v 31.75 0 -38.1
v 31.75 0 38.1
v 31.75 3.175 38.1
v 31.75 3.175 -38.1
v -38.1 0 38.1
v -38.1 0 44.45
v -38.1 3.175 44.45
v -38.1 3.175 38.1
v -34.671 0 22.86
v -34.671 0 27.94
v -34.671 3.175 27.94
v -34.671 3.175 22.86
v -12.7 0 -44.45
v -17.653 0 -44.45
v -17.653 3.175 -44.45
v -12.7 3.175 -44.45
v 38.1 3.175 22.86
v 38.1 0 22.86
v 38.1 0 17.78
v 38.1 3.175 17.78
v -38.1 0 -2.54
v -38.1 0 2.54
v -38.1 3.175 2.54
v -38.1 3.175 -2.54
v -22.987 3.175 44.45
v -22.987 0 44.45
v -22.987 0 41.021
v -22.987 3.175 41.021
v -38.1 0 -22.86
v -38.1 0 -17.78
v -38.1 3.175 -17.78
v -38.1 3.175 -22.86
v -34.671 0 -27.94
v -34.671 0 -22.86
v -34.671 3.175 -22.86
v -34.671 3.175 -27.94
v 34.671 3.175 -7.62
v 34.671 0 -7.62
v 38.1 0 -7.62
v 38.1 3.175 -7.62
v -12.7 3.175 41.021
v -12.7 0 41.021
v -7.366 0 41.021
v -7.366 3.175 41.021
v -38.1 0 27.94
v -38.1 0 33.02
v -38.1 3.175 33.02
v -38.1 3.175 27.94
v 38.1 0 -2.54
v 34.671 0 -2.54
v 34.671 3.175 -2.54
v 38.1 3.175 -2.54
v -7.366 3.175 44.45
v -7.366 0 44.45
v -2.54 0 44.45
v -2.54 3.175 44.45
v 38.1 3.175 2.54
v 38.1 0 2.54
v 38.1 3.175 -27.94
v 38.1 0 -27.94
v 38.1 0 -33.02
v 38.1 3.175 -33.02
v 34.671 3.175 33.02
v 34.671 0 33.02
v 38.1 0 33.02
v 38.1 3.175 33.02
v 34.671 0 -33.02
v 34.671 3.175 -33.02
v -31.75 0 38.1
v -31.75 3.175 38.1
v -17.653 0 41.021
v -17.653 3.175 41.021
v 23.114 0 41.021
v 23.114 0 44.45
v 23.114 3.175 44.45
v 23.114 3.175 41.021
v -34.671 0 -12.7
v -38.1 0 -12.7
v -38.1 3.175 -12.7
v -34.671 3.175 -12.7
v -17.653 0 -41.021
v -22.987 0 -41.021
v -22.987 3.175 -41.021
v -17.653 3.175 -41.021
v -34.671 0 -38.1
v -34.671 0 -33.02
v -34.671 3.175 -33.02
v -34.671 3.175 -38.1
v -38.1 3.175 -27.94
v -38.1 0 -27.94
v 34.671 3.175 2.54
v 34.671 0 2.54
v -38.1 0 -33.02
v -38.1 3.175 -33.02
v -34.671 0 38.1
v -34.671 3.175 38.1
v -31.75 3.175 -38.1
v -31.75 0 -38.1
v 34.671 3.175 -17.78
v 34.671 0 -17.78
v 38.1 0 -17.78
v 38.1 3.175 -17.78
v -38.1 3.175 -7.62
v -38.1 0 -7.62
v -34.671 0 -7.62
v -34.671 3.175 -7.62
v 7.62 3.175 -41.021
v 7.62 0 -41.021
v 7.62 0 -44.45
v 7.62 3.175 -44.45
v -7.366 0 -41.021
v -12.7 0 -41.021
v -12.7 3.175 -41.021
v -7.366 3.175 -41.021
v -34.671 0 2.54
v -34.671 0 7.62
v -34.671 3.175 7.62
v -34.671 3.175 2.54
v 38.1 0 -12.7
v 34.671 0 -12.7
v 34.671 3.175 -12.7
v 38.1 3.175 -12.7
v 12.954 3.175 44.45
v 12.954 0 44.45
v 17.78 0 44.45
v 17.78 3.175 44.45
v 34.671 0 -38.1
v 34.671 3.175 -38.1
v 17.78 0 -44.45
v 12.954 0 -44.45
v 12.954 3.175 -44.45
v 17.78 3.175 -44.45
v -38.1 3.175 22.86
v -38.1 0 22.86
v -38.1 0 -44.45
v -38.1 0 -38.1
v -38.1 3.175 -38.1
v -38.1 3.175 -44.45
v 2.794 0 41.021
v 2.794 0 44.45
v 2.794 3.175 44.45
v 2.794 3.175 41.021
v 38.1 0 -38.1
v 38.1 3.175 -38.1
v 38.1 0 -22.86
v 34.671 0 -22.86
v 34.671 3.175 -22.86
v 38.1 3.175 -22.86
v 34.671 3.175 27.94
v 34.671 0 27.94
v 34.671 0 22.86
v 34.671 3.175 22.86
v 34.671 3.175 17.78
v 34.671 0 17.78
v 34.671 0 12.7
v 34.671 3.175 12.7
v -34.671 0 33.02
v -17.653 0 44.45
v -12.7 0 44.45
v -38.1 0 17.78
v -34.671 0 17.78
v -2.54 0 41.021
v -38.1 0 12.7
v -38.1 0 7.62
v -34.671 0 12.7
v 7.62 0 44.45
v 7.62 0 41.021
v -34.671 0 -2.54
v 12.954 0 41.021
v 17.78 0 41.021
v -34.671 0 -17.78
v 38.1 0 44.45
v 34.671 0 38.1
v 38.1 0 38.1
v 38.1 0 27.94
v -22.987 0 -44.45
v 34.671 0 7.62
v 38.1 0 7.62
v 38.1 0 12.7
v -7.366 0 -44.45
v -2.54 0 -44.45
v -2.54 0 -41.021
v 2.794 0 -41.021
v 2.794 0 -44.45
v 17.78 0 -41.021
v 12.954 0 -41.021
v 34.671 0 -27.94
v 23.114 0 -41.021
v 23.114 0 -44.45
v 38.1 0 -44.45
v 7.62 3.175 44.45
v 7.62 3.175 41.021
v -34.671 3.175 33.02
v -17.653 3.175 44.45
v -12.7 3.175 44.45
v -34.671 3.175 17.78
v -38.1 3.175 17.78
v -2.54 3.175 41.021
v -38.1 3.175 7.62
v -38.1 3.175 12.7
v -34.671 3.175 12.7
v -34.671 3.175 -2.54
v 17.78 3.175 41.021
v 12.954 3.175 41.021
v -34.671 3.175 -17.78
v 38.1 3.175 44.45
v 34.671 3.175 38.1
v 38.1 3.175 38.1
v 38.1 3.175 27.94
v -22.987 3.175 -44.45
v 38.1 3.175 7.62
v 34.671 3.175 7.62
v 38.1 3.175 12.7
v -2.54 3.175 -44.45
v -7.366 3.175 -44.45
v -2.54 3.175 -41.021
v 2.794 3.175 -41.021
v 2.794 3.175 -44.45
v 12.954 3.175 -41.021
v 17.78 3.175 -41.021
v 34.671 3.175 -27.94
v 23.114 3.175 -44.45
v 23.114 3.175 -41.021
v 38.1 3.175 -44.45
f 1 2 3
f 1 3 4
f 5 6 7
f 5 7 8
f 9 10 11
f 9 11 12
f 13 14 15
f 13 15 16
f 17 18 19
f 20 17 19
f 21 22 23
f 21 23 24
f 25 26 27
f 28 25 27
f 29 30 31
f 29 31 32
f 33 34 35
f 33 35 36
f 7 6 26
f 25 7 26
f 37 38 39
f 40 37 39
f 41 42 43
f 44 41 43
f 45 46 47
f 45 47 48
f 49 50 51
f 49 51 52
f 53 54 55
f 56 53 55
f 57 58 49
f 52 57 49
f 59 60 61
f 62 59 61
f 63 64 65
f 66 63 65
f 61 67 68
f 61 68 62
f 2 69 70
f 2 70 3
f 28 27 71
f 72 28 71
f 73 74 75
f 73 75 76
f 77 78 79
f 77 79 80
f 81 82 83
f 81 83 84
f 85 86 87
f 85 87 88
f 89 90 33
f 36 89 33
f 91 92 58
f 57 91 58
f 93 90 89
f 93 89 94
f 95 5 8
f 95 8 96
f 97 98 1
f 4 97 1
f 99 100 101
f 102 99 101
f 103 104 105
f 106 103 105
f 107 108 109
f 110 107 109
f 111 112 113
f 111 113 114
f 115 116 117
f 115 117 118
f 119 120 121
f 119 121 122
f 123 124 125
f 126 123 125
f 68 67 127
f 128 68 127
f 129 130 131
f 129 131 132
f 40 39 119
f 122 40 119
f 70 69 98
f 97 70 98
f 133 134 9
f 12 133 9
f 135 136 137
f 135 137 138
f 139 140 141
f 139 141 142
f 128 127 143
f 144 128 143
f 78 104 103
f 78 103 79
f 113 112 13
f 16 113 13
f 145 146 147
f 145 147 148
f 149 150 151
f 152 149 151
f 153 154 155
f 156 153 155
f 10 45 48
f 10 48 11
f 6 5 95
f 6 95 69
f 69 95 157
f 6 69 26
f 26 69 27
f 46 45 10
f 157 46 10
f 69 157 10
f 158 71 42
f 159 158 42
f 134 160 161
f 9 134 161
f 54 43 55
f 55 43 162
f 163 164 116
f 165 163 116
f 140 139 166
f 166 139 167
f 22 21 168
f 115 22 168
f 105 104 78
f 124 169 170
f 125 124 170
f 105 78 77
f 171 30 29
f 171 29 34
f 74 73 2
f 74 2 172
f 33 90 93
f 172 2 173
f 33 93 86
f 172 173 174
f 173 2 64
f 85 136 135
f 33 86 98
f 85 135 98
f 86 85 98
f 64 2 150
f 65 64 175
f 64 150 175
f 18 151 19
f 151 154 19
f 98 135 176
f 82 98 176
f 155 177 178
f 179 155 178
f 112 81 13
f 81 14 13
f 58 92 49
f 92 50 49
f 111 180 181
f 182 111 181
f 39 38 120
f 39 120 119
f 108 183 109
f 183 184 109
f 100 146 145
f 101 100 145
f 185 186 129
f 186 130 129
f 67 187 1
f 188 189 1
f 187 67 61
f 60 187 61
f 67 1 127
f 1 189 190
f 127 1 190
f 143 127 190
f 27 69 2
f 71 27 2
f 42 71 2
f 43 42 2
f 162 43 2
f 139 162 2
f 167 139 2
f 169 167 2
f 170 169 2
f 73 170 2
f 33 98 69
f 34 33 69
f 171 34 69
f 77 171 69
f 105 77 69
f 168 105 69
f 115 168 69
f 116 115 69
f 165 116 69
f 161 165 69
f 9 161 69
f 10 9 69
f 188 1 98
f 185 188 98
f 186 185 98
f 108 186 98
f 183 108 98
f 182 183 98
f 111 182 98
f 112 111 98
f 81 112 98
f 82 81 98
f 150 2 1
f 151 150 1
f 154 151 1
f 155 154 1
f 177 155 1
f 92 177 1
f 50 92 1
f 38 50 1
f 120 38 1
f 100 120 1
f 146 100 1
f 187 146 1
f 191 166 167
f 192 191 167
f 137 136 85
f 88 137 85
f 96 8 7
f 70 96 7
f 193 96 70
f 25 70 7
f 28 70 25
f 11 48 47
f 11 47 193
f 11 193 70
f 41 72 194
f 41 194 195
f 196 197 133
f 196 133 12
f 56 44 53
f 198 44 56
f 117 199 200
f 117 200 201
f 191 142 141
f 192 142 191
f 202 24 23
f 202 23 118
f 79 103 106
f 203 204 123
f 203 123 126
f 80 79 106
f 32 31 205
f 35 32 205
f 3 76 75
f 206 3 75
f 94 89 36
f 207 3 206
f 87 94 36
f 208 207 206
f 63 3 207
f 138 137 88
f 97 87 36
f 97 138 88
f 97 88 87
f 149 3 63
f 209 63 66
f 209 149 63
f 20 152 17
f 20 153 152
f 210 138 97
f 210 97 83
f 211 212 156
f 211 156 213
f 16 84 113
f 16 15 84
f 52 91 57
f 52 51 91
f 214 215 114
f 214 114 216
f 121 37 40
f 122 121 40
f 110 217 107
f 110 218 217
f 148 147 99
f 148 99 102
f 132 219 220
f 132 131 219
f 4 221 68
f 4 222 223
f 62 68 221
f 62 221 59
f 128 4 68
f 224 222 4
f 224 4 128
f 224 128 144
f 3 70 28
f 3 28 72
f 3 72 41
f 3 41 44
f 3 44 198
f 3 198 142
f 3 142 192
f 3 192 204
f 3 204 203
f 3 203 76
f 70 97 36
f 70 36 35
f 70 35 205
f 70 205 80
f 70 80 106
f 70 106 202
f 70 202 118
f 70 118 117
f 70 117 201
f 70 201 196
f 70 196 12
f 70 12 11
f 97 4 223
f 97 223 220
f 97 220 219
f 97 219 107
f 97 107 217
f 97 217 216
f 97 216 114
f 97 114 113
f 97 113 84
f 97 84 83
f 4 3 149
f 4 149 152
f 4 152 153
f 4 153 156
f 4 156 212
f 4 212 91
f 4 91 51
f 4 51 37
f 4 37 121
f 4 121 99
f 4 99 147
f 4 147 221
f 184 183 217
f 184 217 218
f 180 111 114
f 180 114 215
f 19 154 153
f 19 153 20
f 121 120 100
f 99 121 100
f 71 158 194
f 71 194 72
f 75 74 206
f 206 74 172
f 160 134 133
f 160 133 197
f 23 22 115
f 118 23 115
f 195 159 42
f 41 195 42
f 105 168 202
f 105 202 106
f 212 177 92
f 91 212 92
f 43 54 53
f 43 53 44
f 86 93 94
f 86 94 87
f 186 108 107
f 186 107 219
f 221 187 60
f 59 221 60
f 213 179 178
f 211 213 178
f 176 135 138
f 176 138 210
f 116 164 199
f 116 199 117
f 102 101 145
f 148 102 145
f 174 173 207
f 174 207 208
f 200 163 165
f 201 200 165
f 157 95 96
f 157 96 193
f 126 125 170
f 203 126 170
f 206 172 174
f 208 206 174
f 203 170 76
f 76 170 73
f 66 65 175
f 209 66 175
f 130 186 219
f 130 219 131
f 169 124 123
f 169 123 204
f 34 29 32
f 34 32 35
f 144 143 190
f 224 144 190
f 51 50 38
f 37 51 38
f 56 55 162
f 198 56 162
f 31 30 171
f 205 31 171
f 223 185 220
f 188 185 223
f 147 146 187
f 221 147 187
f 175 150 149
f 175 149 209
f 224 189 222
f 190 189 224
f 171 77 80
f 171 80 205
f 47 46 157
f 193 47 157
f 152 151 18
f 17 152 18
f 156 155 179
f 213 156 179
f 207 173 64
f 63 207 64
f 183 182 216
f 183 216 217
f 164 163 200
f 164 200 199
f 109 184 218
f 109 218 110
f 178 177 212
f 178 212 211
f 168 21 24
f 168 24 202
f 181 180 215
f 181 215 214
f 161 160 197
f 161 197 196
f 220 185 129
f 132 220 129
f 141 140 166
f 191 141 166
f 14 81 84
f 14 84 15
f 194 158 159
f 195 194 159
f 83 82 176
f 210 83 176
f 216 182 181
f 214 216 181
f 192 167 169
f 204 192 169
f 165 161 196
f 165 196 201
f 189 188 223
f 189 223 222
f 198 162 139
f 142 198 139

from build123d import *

# Parameters (mm, degrees)
SKETCH1_W           = 76.2
SKETCH1_H           = 88.9
SKETCH1_W_2         = 63.5
SKETCH1_H_2         = 76.2
BOSS_EXTRUDE1_DEPTH = 3.175
SKETCH2_W           = 5.334
SKETCH2_H           = 3.429
SKETCH2_W_2         = 3.429
SKETCH2_H_2         = 5.08
CUT_EXTRUDE1_DEPTH  = 59.630138368


with BuildPart() as part:
    # Sketch1 → Boss-Extrude1 (new body)
    with BuildSketch(Plane(origin=(0, 0, 0), x_dir=(1, 0, 0), z_dir=(0, 1, 0))):
        Rectangle(SKETCH1_W, SKETCH1_H)
        Rectangle(SKETCH1_W_2, SKETCH1_H_2, mode=Mode.SUBTRACT)
    extrude(amount=BOSS_EXTRUDE1_DEPTH)

    # Sketch2 → Cut-Extrude1 (cut, through all)
    with BuildSketch(Plane(origin=(0, 0, 0), x_dir=(1, 0, 0), z_dir=(0, 1, 0))):
        with Locations((20.447, -42.7355)):
            Rectangle(SKETCH2_W, SKETCH2_H)
        with Locations((10.287, -42.7355)):
            Rectangle(SKETCH2_W, SKETCH2_H)
        with Locations((0.127, -42.7355)):
            Rectangle(SKETCH2_W, SKETCH2_H)
        with Locations((-10.033, -42.7355)):
            Rectangle(SKETCH2_W, SKETCH2_H)
        with Locations((-20.32, -42.7355)):
            Rectangle(SKETCH2_W, SKETCH2_H)
        with Locations((-36.3855, 35.56)):
            Rectangle(SKETCH2_W_2, SKETCH2_H_2)
        with Locations((-36.3855, 25.4)):
            Rectangle(SKETCH2_W_2, SKETCH2_H_2)
        with Locations((-36.3855, 15.24)):
            Rectangle(SKETCH2_W_2, SKETCH2_H_2)
        with Locations((-36.3855, 5.08)):
            Rectangle(SKETCH2_W_2, SKETCH2_H_2)
        with Locations((-36.3855, -5.08)):
            Rectangle(SKETCH2_W_2, SKETCH2_H_2)
        with Locations((-36.3855, -15.24)):
            Rectangle(SKETCH2_W_2, SKETCH2_H_2)
        with Locations((-36.3855, -25.4)):
            Rectangle(SKETCH2_W_2, SKETCH2_H_2)
        with Locations((-36.3855, -35.56)):
            Rectangle(SKETCH2_W_2, SKETCH2_H_2)
        with Locations((36.3855, -35.56)):
            Rectangle(SKETCH2_W_2, SKETCH2_H_2)
        with Locations((36.3855, -25.4)):
            Rectangle(SKETCH2_W_2, SKETCH2_H_2)
        with Locations((36.3855, -15.24)):
            Rectangle(SKETCH2_W_2, SKETCH2_H_2)
        with Locations((36.3855, -5.08)):
            Rectangle(SKETCH2_W_2, SKETCH2_H_2)
        with Locations((36.3855, 5.08)):
            Rectangle(SKETCH2_W_2, SKETCH2_H_2)
        with Locations((36.3855, 15.24)):
            Rectangle(SKETCH2_W_2, SKETCH2_H_2)
        with Locations((36.3855, 25.4)):
            Rectangle(SKETCH2_W_2, SKETCH2_H_2)
        with Locations((36.3855, 35.56)):
            Rectangle(SKETCH2_W_2, SKETCH2_H_2)
        with Locations((-20.32, 42.7355)):
            Rectangle(SKETCH2_W, SKETCH2_H)
        with Locations((-10.033, 42.7355)):
            Rectangle(SKETCH2_W, SKETCH2_H)
        with Locations((0.127, 42.7355)):
            Rectangle(SKETCH2_W, SKETCH2_H)
        with Locations((10.287, 42.7355)):
            Rectangle(SKETCH2_W, SKETCH2_H)
        with Locations((20.447, 42.7355)):
            Rectangle(SKETCH2_W, SKETCH2_H)
    extrude(amount=CUT_EXTRUDE1_DEPTH, mode=Mode.SUBTRACT)


solid = part.part
